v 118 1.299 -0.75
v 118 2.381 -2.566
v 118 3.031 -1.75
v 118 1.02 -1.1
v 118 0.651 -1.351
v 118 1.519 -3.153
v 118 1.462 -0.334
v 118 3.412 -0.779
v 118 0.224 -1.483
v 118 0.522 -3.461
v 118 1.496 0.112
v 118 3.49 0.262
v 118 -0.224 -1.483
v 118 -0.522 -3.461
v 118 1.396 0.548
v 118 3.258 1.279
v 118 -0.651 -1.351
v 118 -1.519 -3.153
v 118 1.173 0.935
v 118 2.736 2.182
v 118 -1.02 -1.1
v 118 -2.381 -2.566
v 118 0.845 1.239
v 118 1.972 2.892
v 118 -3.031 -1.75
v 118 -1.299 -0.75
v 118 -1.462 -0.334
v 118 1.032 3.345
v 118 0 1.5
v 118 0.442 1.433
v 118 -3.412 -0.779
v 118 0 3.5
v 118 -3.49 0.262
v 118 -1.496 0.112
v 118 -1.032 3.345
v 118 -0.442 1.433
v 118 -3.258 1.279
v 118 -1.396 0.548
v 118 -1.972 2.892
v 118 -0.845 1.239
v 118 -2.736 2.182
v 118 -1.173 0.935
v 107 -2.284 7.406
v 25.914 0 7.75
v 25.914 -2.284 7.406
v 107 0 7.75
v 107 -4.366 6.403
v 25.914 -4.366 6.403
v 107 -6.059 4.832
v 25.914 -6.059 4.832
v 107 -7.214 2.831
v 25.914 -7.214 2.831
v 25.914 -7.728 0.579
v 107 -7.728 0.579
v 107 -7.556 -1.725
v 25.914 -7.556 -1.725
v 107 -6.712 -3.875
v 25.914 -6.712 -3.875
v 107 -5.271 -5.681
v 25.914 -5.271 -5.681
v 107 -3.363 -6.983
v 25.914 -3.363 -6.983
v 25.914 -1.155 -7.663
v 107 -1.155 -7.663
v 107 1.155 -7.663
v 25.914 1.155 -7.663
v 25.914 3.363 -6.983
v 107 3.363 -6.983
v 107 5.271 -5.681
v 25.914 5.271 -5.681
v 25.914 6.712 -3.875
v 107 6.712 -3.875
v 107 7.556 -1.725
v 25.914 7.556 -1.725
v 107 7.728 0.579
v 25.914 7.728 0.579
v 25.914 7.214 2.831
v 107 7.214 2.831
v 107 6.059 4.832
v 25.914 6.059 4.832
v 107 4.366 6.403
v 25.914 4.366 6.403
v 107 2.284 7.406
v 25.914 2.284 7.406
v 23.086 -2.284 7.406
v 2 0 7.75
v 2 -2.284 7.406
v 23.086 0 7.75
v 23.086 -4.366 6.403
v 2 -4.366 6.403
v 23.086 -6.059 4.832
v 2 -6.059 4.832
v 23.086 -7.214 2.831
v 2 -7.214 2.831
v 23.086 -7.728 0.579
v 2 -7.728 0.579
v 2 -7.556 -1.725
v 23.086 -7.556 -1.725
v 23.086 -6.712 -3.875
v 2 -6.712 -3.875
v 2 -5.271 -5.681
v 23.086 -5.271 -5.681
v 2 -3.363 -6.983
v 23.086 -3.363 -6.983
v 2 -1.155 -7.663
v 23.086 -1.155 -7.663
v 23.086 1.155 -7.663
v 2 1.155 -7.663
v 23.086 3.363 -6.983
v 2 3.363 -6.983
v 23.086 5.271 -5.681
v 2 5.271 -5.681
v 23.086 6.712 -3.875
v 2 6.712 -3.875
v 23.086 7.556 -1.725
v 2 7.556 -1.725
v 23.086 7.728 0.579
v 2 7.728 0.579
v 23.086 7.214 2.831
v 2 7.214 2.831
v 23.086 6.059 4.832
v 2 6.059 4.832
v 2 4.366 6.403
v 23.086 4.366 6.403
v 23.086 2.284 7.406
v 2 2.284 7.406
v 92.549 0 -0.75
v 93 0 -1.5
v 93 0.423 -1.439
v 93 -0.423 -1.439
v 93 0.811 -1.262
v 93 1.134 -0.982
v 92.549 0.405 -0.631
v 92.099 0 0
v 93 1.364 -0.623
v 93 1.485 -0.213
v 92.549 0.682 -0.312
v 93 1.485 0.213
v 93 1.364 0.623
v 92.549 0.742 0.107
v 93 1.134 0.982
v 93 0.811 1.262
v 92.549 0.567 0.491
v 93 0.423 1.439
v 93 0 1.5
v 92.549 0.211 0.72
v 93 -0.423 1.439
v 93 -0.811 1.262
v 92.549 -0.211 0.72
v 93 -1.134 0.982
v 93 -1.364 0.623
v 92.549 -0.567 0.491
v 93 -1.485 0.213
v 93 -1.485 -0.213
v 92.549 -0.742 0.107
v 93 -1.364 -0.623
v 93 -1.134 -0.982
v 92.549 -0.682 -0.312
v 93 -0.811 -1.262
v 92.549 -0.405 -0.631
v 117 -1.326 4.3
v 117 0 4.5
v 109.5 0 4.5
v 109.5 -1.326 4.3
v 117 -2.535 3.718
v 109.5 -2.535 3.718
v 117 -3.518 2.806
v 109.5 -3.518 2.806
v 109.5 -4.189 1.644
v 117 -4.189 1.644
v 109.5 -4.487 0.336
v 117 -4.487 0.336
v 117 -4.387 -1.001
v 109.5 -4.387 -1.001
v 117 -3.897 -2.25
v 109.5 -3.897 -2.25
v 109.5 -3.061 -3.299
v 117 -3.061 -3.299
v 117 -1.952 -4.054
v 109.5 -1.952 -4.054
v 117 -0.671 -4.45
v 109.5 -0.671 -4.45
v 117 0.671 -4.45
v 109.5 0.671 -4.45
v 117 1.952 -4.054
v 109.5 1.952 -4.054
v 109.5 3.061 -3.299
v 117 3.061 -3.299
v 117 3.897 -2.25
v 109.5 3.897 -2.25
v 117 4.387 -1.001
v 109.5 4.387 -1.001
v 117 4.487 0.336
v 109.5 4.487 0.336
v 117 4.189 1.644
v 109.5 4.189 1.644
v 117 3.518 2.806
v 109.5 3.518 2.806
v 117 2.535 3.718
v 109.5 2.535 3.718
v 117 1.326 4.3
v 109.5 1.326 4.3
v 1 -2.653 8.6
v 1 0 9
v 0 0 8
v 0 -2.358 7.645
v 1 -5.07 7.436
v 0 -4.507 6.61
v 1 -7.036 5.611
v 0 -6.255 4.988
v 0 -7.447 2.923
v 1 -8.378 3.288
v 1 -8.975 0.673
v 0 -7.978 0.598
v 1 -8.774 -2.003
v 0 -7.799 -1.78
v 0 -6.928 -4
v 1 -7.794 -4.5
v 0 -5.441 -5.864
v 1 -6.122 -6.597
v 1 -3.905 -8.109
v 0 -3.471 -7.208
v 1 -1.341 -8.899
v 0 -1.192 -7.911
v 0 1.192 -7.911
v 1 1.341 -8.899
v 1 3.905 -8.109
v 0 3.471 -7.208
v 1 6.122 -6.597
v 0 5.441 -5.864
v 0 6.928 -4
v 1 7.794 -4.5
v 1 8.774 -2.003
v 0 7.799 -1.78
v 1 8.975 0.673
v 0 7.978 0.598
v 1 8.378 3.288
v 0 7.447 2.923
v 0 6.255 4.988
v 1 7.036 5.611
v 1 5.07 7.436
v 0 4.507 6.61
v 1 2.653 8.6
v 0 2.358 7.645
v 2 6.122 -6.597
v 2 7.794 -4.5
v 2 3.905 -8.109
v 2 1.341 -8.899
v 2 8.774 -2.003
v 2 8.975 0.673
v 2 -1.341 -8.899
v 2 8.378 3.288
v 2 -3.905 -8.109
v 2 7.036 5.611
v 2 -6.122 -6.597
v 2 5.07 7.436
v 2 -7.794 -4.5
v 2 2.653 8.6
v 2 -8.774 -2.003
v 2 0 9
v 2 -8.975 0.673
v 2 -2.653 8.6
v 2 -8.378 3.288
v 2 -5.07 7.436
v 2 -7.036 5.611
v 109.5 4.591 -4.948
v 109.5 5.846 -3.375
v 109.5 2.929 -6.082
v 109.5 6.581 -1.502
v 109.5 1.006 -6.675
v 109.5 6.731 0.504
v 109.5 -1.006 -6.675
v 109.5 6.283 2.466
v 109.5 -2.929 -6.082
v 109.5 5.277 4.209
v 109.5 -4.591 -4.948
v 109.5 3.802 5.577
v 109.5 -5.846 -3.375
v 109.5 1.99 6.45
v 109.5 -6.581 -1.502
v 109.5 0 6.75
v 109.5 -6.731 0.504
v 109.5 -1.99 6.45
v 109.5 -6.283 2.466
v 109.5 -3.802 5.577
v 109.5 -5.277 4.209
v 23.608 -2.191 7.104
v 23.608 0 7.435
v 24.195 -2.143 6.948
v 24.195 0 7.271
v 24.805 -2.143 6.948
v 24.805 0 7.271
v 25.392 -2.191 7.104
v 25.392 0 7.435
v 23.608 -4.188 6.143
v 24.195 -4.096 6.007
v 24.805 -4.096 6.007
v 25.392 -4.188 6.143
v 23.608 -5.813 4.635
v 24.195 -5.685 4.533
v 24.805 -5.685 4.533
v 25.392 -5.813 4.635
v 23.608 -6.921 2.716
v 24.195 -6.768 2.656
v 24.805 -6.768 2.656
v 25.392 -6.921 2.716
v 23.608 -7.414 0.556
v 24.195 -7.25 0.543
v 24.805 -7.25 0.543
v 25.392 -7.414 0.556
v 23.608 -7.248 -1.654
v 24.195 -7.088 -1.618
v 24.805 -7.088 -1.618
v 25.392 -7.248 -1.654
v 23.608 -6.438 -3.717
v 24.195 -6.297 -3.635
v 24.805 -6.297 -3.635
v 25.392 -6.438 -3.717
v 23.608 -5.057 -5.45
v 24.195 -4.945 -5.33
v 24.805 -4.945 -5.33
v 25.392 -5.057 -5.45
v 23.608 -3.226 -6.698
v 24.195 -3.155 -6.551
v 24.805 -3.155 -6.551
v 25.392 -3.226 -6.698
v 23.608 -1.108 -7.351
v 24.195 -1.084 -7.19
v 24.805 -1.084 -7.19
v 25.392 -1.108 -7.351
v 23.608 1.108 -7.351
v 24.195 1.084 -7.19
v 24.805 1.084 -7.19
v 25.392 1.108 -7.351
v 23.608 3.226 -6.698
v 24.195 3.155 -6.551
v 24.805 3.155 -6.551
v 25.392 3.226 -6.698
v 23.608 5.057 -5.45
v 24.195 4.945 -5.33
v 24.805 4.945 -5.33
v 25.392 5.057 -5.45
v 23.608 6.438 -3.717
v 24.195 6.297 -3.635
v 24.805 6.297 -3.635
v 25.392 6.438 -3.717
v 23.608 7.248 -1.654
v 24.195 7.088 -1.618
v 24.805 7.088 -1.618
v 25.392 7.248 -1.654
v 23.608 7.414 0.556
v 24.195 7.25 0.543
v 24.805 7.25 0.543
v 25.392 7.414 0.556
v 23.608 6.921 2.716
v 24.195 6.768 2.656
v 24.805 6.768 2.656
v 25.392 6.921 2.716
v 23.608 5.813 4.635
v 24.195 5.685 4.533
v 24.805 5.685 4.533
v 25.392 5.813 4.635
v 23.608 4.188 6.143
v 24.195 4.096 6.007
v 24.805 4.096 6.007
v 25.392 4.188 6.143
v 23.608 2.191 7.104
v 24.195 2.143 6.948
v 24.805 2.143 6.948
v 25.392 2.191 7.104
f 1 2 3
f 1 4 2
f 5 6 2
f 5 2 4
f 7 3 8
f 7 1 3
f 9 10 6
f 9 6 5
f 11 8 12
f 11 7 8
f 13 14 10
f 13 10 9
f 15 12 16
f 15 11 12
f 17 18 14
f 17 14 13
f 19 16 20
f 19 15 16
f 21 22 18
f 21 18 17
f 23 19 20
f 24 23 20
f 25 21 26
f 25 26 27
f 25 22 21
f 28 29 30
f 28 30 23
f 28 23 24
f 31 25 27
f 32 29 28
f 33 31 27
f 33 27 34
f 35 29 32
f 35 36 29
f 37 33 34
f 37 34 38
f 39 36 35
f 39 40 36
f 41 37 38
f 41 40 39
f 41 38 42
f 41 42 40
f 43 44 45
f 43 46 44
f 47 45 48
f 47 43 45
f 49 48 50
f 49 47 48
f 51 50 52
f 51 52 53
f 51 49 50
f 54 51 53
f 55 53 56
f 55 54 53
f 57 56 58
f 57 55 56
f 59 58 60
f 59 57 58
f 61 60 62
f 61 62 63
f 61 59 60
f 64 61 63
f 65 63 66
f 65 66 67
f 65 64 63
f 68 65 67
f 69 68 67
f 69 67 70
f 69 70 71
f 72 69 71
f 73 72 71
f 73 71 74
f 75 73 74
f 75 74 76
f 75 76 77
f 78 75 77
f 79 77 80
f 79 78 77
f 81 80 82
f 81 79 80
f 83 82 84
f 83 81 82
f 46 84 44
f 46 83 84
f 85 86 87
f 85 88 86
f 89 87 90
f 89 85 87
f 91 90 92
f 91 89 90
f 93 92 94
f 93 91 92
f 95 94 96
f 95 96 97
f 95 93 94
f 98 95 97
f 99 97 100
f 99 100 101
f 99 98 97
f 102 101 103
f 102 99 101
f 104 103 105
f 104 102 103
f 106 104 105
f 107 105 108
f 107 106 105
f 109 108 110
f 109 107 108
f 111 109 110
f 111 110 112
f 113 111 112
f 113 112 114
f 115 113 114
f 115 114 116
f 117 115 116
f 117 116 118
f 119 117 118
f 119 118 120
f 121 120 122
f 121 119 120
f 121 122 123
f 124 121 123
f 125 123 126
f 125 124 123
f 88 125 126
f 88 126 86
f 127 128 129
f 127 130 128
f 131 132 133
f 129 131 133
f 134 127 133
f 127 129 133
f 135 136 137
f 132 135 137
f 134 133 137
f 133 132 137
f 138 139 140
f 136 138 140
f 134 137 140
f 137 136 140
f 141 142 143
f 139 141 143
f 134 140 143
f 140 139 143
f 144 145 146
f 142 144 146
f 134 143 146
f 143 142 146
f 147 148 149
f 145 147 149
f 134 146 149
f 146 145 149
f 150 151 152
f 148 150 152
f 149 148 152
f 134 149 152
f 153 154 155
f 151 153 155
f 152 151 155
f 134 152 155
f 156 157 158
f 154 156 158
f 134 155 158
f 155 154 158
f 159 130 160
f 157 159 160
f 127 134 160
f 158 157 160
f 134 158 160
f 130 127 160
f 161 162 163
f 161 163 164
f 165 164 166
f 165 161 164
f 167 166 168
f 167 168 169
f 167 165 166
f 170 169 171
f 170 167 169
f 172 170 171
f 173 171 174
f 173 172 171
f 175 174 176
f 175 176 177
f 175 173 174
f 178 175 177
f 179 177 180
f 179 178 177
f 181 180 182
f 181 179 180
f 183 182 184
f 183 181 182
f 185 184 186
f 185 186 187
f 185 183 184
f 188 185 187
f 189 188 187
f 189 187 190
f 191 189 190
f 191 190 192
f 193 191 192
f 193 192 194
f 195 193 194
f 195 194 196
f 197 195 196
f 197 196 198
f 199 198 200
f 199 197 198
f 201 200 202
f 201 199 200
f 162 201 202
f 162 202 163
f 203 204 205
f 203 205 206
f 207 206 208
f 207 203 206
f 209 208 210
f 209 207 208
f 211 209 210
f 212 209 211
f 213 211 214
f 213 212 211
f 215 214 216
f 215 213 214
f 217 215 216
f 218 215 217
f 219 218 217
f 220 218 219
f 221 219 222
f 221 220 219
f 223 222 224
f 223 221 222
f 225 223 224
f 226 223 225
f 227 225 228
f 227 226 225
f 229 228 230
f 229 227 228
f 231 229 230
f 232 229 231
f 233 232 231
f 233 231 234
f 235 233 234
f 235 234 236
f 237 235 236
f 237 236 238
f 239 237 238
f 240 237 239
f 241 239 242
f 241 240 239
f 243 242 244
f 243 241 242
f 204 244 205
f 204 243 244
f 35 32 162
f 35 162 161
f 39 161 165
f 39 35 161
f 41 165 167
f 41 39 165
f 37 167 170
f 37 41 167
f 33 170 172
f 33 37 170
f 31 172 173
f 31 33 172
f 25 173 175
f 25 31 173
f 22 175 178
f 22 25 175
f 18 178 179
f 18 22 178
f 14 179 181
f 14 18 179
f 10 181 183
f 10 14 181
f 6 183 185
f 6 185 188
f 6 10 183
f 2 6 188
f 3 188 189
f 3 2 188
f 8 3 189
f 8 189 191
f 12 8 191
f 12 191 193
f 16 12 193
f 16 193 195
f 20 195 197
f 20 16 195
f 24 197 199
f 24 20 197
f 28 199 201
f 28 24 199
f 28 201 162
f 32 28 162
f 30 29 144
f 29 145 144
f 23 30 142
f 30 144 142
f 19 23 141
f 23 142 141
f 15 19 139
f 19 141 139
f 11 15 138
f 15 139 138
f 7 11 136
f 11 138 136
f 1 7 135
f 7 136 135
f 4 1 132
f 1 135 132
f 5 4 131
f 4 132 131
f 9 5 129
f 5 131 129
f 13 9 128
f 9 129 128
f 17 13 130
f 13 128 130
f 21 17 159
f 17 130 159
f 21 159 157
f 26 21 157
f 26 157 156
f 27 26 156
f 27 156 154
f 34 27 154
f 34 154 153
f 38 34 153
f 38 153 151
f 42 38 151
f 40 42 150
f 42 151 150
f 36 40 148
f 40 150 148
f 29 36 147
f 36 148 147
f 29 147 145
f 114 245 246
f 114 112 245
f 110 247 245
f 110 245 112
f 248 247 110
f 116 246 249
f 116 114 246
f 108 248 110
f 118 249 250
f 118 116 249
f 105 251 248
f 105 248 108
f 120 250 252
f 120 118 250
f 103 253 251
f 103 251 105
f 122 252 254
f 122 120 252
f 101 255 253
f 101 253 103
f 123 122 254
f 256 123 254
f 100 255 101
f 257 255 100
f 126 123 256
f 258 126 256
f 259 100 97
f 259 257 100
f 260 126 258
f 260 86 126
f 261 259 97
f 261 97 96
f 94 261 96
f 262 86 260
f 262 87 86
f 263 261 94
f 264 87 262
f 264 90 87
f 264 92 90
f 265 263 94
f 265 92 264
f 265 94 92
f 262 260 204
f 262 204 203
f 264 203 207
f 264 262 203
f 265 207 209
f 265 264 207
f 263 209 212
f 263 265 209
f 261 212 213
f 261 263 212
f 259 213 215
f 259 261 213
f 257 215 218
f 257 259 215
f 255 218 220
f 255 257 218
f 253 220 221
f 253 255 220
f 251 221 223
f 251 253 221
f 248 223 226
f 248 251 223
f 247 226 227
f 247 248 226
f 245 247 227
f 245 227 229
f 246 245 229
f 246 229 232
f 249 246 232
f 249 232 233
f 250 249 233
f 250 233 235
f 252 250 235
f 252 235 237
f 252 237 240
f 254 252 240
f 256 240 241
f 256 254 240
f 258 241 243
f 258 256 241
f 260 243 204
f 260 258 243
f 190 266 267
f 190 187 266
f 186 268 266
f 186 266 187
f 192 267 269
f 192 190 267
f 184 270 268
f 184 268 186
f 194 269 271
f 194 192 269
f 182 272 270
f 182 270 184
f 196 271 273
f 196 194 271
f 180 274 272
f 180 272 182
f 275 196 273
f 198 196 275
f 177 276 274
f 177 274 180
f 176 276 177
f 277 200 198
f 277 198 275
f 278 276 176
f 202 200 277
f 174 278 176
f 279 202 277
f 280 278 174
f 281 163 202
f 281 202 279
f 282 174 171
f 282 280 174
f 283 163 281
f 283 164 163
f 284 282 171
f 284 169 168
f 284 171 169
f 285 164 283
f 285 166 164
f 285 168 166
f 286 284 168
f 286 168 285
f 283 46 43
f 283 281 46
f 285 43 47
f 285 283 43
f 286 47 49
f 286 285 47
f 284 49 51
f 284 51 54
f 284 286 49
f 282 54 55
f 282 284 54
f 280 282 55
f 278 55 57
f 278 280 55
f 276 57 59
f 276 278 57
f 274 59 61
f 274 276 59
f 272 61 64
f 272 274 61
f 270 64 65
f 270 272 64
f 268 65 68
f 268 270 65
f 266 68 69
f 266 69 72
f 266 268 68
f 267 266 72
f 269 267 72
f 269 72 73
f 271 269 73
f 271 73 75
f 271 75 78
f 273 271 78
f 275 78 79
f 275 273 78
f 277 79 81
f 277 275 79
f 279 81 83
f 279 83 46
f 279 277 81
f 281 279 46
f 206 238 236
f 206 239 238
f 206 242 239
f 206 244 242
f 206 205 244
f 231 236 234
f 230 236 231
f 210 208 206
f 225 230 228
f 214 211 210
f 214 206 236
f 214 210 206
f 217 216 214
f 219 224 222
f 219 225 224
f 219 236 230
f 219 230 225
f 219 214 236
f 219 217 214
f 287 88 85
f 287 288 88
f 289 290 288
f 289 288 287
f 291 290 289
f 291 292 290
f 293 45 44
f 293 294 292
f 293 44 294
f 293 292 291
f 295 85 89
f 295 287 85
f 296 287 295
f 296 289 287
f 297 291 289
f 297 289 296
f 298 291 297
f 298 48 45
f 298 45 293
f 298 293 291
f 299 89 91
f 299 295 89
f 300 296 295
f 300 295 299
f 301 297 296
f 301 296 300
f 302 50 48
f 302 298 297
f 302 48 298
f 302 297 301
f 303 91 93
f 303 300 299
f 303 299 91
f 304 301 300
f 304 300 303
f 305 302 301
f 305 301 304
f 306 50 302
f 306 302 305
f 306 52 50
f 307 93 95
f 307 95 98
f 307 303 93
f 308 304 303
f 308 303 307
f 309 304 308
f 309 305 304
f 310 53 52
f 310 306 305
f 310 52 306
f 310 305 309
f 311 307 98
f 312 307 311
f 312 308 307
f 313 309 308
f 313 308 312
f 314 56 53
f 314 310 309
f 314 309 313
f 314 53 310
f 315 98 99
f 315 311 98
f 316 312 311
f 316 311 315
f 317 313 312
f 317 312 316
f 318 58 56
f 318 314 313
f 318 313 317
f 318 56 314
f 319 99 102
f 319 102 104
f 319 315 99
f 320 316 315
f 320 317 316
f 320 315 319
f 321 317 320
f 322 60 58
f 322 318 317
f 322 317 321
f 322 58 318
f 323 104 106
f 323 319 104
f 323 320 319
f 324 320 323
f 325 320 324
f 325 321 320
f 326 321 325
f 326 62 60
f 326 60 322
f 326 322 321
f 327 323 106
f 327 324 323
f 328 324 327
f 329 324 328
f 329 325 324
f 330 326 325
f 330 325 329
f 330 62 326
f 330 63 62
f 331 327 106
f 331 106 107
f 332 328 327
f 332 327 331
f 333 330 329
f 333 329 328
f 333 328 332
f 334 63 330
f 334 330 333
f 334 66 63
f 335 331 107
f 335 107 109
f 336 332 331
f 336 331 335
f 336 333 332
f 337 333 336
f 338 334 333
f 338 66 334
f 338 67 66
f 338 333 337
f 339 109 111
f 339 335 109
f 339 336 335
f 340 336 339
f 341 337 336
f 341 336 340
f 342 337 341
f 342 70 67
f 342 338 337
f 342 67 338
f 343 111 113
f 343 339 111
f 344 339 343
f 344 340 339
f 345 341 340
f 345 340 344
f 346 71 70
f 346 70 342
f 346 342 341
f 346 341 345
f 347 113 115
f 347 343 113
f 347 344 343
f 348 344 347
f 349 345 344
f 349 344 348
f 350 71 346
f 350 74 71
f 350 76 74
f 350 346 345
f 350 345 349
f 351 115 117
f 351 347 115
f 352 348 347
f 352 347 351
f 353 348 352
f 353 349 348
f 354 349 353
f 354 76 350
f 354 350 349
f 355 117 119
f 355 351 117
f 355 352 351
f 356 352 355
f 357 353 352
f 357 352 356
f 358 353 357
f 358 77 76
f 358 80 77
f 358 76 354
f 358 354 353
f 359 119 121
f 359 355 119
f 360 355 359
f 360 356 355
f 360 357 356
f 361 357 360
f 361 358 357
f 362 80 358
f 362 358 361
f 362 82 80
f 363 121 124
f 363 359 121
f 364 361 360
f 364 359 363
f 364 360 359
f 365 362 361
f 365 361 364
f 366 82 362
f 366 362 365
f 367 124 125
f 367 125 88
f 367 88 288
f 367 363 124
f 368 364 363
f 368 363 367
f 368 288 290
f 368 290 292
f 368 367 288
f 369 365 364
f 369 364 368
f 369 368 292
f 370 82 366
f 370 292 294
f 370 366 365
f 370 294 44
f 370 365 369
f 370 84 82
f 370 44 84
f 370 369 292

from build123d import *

# Parameters (mm, degrees)
CHANFREIN1_SIZE = 1
PER_AGE1_D      = 3
PER_AGE1_DEPTH  = 25
PER_AGE1_TIP    = 0.901290929


with BuildPart() as part:
    # Esquisse1 → Base-Révolution (revolve)
    with BuildSketch(Plane.XY, mode=Mode.PRIVATE) as base_r_volution_sk:
        with BuildLine():
            Line((0, 0), (0, -9))
            Line((0, -9), (2, -9))
            Line((2, -9), (2, -7.75))
            Line((2, -7.75), (23.085786438, -7.75))
            ThreePointArc((23.085786438, -7.75), (24.5, -7.25), (25.914213562, -7.75))
            Line((25.914213562, -7.75), (107, -7.75))
            Line((107, -7.75), (109.5, -6.75))
            Line((109.5, -6.75), (109.5, -4.5))
            Line((109.5, -4.5), (118, -4.5))
            Line((118, -4.5), (118, 0))
            Line((118, 0), (0, 0))
        make_face()
    revolve(base_r_volution_sk.sketch.rotate(Axis((-10, 0, 0), (1, 0, 0)), 270), axis=Axis((-10, 0, 0), (1, 0, 0)))

    # Chanfrein1
    chanfrein1_edges = [part.edges().sort_by_distance(p)[0] for p in [
        (0, 0, -9),
        (118, 0, -4.5),
    ]]
    chamfer(chanfrein1_edges, length=CHANFREIN1_SIZE)

    # Perçage1
    with Locations(Plane(origin=(118, 0, 0), x_dir=(0, 0, -1), z_dir=(1, 0, 0))):
        with Locations((0, 0)):
            Hole(PER_AGE1_D / 2, depth=PER_AGE1_DEPTH)
            with Locations((0, 0, -(PER_AGE1_DEPTH + PER_AGE1_TIP / 2))):  # 118° drill point
                Cone(0, PER_AGE1_D / 2, PER_AGE1_TIP, mode=Mode.SUBTRACT)


solid = part.part
